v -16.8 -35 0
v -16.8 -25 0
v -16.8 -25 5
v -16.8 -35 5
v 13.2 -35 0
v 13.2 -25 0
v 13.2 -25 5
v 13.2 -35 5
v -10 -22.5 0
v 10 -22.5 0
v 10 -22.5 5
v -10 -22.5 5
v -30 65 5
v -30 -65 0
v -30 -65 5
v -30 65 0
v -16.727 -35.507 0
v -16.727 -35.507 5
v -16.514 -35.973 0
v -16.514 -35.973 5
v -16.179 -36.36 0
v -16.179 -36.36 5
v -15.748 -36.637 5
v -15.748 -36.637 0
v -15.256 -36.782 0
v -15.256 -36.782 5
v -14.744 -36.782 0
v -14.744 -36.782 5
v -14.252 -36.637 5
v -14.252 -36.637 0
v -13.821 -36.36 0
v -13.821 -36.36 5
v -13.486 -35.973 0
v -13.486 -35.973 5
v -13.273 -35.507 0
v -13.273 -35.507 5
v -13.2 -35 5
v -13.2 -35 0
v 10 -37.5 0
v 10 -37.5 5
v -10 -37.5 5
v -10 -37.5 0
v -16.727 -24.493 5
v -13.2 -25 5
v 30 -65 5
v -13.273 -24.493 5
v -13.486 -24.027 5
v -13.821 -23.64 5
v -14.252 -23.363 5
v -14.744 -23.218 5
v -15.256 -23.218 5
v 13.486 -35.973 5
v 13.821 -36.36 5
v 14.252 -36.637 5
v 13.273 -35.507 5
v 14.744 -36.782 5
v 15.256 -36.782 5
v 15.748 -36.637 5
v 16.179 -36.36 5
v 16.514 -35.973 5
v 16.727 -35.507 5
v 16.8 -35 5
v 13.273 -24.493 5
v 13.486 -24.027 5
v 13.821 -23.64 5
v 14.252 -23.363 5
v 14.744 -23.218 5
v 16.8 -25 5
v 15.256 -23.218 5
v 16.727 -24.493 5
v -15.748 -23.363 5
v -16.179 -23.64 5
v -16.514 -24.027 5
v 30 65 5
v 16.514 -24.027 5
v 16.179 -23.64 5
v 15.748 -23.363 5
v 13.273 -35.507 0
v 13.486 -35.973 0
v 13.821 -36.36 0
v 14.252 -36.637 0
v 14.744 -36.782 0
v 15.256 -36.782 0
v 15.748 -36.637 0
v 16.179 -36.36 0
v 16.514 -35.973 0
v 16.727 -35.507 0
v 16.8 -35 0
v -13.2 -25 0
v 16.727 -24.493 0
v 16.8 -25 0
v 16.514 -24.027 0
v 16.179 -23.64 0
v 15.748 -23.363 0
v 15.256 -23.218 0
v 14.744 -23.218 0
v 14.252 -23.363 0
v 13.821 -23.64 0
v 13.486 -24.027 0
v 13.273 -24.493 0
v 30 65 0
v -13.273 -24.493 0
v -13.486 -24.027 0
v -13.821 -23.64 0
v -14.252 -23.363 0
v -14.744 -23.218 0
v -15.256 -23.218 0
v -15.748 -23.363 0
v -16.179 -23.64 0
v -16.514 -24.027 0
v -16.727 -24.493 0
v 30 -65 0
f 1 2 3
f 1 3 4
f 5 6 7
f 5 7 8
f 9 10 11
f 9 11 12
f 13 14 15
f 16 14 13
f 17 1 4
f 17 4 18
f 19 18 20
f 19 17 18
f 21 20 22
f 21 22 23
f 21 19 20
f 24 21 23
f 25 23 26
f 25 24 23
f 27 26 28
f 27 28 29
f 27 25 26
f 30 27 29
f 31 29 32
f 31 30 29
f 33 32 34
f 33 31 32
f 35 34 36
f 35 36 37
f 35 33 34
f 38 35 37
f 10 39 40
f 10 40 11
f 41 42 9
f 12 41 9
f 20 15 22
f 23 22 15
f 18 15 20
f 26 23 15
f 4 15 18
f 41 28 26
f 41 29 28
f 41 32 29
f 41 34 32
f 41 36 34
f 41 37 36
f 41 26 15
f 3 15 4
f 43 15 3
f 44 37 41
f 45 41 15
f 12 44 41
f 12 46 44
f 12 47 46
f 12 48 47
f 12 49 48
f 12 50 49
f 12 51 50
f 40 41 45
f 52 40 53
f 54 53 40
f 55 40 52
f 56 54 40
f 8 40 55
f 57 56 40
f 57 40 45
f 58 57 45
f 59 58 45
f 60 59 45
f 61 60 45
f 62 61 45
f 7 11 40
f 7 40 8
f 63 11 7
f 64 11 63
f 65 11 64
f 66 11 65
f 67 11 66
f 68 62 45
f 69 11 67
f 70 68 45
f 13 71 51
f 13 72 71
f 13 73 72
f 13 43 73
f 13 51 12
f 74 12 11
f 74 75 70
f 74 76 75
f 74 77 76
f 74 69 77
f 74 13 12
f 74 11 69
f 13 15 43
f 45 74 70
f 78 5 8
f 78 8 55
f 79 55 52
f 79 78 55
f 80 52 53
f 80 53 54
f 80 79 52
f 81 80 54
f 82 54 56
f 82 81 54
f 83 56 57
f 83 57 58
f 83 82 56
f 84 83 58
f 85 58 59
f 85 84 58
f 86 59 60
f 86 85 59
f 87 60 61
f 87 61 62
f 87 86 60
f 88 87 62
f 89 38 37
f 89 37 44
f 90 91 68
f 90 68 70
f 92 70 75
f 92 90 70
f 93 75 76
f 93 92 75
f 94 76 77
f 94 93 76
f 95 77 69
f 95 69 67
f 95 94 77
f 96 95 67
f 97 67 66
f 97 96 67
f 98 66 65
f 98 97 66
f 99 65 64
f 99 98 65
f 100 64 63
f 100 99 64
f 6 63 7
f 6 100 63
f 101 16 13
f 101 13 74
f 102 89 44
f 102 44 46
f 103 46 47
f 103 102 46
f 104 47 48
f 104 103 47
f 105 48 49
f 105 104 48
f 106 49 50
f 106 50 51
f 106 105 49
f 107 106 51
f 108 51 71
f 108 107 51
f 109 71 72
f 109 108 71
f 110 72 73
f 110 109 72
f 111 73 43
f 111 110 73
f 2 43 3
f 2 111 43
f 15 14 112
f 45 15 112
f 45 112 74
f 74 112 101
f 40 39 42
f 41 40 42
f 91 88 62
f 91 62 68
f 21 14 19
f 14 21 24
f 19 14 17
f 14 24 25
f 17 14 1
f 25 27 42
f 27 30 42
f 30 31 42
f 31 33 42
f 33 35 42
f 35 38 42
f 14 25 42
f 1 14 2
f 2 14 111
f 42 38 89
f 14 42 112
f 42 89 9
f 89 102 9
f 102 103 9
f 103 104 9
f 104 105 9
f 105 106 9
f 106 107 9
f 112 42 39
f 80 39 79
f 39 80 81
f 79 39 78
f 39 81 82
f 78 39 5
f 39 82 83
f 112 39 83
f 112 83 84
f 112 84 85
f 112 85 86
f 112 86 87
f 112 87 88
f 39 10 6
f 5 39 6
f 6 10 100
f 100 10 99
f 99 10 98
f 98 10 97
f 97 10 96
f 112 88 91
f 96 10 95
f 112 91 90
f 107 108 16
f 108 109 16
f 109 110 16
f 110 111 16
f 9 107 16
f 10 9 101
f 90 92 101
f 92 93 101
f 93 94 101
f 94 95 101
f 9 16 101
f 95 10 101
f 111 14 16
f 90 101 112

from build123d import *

# Parameters (mm, degrees)
SKETCH1_W           = 60
SKETCH1_H           = 130
BOSS_EXTRUDE1_DEPTH = 5
SKETCH2_W           = 20
SKETCH2_H           = 15
CUT_EXTRUDE1_DEPTH  = 5
CUT_EXTRUDE2_DEPTH  = 5


with BuildPart() as part:
    # Sketch1 → Boss-Extrude1 (new body)
    with BuildSketch(Plane.XY):
        Rectangle(SKETCH1_W, SKETCH1_H)
    extrude(amount=BOSS_EXTRUDE1_DEPTH)

    # Sketch2 → Cut-Extrude1 (cut)
    with BuildSketch(Plane(origin=(0, 0, 0), x_dir=(-1, 0, 0), z_dir=(0, 0, -1))):
        with Locations((0, -30)):
            Rectangle(SKETCH2_W, SKETCH2_H)
    extrude(amount=-CUT_EXTRUDE1_DEPTH, mode=Mode.SUBTRACT)

    # Sketch3 → Cut-Extrude2 (cut)
    with BuildSketch(Plane(origin=(0, 0, 0), x_dir=(-1, 0, 0), z_dir=(0, 0, -1))):
        with BuildLine():
            Line((16.8, -25), (16.8, -35))
            ThreePointArc((16.8, -35), (15, -36.8), (13.2, -35))
            Line((13.2, -35), (13.2, -25))
            ThreePointArc((13.2, -25), (15, -23.2), (16.8, -25))
        make_face()
        with BuildLine():
            Line((-13.2, -25), (-13.2, -35))
            ThreePointArc((-13.2, -35), (-15, -36.8), (-16.8, -35))
            Line((-16.8, -35), (-16.8, -25))
            ThreePointArc((-16.8, -25), (-15, -23.2), (-13.2, -25))
        make_face()
    extrude(amount=-CUT_EXTRUDE2_DEPTH, mode=Mode.SUBTRACT)


solid = part.part
